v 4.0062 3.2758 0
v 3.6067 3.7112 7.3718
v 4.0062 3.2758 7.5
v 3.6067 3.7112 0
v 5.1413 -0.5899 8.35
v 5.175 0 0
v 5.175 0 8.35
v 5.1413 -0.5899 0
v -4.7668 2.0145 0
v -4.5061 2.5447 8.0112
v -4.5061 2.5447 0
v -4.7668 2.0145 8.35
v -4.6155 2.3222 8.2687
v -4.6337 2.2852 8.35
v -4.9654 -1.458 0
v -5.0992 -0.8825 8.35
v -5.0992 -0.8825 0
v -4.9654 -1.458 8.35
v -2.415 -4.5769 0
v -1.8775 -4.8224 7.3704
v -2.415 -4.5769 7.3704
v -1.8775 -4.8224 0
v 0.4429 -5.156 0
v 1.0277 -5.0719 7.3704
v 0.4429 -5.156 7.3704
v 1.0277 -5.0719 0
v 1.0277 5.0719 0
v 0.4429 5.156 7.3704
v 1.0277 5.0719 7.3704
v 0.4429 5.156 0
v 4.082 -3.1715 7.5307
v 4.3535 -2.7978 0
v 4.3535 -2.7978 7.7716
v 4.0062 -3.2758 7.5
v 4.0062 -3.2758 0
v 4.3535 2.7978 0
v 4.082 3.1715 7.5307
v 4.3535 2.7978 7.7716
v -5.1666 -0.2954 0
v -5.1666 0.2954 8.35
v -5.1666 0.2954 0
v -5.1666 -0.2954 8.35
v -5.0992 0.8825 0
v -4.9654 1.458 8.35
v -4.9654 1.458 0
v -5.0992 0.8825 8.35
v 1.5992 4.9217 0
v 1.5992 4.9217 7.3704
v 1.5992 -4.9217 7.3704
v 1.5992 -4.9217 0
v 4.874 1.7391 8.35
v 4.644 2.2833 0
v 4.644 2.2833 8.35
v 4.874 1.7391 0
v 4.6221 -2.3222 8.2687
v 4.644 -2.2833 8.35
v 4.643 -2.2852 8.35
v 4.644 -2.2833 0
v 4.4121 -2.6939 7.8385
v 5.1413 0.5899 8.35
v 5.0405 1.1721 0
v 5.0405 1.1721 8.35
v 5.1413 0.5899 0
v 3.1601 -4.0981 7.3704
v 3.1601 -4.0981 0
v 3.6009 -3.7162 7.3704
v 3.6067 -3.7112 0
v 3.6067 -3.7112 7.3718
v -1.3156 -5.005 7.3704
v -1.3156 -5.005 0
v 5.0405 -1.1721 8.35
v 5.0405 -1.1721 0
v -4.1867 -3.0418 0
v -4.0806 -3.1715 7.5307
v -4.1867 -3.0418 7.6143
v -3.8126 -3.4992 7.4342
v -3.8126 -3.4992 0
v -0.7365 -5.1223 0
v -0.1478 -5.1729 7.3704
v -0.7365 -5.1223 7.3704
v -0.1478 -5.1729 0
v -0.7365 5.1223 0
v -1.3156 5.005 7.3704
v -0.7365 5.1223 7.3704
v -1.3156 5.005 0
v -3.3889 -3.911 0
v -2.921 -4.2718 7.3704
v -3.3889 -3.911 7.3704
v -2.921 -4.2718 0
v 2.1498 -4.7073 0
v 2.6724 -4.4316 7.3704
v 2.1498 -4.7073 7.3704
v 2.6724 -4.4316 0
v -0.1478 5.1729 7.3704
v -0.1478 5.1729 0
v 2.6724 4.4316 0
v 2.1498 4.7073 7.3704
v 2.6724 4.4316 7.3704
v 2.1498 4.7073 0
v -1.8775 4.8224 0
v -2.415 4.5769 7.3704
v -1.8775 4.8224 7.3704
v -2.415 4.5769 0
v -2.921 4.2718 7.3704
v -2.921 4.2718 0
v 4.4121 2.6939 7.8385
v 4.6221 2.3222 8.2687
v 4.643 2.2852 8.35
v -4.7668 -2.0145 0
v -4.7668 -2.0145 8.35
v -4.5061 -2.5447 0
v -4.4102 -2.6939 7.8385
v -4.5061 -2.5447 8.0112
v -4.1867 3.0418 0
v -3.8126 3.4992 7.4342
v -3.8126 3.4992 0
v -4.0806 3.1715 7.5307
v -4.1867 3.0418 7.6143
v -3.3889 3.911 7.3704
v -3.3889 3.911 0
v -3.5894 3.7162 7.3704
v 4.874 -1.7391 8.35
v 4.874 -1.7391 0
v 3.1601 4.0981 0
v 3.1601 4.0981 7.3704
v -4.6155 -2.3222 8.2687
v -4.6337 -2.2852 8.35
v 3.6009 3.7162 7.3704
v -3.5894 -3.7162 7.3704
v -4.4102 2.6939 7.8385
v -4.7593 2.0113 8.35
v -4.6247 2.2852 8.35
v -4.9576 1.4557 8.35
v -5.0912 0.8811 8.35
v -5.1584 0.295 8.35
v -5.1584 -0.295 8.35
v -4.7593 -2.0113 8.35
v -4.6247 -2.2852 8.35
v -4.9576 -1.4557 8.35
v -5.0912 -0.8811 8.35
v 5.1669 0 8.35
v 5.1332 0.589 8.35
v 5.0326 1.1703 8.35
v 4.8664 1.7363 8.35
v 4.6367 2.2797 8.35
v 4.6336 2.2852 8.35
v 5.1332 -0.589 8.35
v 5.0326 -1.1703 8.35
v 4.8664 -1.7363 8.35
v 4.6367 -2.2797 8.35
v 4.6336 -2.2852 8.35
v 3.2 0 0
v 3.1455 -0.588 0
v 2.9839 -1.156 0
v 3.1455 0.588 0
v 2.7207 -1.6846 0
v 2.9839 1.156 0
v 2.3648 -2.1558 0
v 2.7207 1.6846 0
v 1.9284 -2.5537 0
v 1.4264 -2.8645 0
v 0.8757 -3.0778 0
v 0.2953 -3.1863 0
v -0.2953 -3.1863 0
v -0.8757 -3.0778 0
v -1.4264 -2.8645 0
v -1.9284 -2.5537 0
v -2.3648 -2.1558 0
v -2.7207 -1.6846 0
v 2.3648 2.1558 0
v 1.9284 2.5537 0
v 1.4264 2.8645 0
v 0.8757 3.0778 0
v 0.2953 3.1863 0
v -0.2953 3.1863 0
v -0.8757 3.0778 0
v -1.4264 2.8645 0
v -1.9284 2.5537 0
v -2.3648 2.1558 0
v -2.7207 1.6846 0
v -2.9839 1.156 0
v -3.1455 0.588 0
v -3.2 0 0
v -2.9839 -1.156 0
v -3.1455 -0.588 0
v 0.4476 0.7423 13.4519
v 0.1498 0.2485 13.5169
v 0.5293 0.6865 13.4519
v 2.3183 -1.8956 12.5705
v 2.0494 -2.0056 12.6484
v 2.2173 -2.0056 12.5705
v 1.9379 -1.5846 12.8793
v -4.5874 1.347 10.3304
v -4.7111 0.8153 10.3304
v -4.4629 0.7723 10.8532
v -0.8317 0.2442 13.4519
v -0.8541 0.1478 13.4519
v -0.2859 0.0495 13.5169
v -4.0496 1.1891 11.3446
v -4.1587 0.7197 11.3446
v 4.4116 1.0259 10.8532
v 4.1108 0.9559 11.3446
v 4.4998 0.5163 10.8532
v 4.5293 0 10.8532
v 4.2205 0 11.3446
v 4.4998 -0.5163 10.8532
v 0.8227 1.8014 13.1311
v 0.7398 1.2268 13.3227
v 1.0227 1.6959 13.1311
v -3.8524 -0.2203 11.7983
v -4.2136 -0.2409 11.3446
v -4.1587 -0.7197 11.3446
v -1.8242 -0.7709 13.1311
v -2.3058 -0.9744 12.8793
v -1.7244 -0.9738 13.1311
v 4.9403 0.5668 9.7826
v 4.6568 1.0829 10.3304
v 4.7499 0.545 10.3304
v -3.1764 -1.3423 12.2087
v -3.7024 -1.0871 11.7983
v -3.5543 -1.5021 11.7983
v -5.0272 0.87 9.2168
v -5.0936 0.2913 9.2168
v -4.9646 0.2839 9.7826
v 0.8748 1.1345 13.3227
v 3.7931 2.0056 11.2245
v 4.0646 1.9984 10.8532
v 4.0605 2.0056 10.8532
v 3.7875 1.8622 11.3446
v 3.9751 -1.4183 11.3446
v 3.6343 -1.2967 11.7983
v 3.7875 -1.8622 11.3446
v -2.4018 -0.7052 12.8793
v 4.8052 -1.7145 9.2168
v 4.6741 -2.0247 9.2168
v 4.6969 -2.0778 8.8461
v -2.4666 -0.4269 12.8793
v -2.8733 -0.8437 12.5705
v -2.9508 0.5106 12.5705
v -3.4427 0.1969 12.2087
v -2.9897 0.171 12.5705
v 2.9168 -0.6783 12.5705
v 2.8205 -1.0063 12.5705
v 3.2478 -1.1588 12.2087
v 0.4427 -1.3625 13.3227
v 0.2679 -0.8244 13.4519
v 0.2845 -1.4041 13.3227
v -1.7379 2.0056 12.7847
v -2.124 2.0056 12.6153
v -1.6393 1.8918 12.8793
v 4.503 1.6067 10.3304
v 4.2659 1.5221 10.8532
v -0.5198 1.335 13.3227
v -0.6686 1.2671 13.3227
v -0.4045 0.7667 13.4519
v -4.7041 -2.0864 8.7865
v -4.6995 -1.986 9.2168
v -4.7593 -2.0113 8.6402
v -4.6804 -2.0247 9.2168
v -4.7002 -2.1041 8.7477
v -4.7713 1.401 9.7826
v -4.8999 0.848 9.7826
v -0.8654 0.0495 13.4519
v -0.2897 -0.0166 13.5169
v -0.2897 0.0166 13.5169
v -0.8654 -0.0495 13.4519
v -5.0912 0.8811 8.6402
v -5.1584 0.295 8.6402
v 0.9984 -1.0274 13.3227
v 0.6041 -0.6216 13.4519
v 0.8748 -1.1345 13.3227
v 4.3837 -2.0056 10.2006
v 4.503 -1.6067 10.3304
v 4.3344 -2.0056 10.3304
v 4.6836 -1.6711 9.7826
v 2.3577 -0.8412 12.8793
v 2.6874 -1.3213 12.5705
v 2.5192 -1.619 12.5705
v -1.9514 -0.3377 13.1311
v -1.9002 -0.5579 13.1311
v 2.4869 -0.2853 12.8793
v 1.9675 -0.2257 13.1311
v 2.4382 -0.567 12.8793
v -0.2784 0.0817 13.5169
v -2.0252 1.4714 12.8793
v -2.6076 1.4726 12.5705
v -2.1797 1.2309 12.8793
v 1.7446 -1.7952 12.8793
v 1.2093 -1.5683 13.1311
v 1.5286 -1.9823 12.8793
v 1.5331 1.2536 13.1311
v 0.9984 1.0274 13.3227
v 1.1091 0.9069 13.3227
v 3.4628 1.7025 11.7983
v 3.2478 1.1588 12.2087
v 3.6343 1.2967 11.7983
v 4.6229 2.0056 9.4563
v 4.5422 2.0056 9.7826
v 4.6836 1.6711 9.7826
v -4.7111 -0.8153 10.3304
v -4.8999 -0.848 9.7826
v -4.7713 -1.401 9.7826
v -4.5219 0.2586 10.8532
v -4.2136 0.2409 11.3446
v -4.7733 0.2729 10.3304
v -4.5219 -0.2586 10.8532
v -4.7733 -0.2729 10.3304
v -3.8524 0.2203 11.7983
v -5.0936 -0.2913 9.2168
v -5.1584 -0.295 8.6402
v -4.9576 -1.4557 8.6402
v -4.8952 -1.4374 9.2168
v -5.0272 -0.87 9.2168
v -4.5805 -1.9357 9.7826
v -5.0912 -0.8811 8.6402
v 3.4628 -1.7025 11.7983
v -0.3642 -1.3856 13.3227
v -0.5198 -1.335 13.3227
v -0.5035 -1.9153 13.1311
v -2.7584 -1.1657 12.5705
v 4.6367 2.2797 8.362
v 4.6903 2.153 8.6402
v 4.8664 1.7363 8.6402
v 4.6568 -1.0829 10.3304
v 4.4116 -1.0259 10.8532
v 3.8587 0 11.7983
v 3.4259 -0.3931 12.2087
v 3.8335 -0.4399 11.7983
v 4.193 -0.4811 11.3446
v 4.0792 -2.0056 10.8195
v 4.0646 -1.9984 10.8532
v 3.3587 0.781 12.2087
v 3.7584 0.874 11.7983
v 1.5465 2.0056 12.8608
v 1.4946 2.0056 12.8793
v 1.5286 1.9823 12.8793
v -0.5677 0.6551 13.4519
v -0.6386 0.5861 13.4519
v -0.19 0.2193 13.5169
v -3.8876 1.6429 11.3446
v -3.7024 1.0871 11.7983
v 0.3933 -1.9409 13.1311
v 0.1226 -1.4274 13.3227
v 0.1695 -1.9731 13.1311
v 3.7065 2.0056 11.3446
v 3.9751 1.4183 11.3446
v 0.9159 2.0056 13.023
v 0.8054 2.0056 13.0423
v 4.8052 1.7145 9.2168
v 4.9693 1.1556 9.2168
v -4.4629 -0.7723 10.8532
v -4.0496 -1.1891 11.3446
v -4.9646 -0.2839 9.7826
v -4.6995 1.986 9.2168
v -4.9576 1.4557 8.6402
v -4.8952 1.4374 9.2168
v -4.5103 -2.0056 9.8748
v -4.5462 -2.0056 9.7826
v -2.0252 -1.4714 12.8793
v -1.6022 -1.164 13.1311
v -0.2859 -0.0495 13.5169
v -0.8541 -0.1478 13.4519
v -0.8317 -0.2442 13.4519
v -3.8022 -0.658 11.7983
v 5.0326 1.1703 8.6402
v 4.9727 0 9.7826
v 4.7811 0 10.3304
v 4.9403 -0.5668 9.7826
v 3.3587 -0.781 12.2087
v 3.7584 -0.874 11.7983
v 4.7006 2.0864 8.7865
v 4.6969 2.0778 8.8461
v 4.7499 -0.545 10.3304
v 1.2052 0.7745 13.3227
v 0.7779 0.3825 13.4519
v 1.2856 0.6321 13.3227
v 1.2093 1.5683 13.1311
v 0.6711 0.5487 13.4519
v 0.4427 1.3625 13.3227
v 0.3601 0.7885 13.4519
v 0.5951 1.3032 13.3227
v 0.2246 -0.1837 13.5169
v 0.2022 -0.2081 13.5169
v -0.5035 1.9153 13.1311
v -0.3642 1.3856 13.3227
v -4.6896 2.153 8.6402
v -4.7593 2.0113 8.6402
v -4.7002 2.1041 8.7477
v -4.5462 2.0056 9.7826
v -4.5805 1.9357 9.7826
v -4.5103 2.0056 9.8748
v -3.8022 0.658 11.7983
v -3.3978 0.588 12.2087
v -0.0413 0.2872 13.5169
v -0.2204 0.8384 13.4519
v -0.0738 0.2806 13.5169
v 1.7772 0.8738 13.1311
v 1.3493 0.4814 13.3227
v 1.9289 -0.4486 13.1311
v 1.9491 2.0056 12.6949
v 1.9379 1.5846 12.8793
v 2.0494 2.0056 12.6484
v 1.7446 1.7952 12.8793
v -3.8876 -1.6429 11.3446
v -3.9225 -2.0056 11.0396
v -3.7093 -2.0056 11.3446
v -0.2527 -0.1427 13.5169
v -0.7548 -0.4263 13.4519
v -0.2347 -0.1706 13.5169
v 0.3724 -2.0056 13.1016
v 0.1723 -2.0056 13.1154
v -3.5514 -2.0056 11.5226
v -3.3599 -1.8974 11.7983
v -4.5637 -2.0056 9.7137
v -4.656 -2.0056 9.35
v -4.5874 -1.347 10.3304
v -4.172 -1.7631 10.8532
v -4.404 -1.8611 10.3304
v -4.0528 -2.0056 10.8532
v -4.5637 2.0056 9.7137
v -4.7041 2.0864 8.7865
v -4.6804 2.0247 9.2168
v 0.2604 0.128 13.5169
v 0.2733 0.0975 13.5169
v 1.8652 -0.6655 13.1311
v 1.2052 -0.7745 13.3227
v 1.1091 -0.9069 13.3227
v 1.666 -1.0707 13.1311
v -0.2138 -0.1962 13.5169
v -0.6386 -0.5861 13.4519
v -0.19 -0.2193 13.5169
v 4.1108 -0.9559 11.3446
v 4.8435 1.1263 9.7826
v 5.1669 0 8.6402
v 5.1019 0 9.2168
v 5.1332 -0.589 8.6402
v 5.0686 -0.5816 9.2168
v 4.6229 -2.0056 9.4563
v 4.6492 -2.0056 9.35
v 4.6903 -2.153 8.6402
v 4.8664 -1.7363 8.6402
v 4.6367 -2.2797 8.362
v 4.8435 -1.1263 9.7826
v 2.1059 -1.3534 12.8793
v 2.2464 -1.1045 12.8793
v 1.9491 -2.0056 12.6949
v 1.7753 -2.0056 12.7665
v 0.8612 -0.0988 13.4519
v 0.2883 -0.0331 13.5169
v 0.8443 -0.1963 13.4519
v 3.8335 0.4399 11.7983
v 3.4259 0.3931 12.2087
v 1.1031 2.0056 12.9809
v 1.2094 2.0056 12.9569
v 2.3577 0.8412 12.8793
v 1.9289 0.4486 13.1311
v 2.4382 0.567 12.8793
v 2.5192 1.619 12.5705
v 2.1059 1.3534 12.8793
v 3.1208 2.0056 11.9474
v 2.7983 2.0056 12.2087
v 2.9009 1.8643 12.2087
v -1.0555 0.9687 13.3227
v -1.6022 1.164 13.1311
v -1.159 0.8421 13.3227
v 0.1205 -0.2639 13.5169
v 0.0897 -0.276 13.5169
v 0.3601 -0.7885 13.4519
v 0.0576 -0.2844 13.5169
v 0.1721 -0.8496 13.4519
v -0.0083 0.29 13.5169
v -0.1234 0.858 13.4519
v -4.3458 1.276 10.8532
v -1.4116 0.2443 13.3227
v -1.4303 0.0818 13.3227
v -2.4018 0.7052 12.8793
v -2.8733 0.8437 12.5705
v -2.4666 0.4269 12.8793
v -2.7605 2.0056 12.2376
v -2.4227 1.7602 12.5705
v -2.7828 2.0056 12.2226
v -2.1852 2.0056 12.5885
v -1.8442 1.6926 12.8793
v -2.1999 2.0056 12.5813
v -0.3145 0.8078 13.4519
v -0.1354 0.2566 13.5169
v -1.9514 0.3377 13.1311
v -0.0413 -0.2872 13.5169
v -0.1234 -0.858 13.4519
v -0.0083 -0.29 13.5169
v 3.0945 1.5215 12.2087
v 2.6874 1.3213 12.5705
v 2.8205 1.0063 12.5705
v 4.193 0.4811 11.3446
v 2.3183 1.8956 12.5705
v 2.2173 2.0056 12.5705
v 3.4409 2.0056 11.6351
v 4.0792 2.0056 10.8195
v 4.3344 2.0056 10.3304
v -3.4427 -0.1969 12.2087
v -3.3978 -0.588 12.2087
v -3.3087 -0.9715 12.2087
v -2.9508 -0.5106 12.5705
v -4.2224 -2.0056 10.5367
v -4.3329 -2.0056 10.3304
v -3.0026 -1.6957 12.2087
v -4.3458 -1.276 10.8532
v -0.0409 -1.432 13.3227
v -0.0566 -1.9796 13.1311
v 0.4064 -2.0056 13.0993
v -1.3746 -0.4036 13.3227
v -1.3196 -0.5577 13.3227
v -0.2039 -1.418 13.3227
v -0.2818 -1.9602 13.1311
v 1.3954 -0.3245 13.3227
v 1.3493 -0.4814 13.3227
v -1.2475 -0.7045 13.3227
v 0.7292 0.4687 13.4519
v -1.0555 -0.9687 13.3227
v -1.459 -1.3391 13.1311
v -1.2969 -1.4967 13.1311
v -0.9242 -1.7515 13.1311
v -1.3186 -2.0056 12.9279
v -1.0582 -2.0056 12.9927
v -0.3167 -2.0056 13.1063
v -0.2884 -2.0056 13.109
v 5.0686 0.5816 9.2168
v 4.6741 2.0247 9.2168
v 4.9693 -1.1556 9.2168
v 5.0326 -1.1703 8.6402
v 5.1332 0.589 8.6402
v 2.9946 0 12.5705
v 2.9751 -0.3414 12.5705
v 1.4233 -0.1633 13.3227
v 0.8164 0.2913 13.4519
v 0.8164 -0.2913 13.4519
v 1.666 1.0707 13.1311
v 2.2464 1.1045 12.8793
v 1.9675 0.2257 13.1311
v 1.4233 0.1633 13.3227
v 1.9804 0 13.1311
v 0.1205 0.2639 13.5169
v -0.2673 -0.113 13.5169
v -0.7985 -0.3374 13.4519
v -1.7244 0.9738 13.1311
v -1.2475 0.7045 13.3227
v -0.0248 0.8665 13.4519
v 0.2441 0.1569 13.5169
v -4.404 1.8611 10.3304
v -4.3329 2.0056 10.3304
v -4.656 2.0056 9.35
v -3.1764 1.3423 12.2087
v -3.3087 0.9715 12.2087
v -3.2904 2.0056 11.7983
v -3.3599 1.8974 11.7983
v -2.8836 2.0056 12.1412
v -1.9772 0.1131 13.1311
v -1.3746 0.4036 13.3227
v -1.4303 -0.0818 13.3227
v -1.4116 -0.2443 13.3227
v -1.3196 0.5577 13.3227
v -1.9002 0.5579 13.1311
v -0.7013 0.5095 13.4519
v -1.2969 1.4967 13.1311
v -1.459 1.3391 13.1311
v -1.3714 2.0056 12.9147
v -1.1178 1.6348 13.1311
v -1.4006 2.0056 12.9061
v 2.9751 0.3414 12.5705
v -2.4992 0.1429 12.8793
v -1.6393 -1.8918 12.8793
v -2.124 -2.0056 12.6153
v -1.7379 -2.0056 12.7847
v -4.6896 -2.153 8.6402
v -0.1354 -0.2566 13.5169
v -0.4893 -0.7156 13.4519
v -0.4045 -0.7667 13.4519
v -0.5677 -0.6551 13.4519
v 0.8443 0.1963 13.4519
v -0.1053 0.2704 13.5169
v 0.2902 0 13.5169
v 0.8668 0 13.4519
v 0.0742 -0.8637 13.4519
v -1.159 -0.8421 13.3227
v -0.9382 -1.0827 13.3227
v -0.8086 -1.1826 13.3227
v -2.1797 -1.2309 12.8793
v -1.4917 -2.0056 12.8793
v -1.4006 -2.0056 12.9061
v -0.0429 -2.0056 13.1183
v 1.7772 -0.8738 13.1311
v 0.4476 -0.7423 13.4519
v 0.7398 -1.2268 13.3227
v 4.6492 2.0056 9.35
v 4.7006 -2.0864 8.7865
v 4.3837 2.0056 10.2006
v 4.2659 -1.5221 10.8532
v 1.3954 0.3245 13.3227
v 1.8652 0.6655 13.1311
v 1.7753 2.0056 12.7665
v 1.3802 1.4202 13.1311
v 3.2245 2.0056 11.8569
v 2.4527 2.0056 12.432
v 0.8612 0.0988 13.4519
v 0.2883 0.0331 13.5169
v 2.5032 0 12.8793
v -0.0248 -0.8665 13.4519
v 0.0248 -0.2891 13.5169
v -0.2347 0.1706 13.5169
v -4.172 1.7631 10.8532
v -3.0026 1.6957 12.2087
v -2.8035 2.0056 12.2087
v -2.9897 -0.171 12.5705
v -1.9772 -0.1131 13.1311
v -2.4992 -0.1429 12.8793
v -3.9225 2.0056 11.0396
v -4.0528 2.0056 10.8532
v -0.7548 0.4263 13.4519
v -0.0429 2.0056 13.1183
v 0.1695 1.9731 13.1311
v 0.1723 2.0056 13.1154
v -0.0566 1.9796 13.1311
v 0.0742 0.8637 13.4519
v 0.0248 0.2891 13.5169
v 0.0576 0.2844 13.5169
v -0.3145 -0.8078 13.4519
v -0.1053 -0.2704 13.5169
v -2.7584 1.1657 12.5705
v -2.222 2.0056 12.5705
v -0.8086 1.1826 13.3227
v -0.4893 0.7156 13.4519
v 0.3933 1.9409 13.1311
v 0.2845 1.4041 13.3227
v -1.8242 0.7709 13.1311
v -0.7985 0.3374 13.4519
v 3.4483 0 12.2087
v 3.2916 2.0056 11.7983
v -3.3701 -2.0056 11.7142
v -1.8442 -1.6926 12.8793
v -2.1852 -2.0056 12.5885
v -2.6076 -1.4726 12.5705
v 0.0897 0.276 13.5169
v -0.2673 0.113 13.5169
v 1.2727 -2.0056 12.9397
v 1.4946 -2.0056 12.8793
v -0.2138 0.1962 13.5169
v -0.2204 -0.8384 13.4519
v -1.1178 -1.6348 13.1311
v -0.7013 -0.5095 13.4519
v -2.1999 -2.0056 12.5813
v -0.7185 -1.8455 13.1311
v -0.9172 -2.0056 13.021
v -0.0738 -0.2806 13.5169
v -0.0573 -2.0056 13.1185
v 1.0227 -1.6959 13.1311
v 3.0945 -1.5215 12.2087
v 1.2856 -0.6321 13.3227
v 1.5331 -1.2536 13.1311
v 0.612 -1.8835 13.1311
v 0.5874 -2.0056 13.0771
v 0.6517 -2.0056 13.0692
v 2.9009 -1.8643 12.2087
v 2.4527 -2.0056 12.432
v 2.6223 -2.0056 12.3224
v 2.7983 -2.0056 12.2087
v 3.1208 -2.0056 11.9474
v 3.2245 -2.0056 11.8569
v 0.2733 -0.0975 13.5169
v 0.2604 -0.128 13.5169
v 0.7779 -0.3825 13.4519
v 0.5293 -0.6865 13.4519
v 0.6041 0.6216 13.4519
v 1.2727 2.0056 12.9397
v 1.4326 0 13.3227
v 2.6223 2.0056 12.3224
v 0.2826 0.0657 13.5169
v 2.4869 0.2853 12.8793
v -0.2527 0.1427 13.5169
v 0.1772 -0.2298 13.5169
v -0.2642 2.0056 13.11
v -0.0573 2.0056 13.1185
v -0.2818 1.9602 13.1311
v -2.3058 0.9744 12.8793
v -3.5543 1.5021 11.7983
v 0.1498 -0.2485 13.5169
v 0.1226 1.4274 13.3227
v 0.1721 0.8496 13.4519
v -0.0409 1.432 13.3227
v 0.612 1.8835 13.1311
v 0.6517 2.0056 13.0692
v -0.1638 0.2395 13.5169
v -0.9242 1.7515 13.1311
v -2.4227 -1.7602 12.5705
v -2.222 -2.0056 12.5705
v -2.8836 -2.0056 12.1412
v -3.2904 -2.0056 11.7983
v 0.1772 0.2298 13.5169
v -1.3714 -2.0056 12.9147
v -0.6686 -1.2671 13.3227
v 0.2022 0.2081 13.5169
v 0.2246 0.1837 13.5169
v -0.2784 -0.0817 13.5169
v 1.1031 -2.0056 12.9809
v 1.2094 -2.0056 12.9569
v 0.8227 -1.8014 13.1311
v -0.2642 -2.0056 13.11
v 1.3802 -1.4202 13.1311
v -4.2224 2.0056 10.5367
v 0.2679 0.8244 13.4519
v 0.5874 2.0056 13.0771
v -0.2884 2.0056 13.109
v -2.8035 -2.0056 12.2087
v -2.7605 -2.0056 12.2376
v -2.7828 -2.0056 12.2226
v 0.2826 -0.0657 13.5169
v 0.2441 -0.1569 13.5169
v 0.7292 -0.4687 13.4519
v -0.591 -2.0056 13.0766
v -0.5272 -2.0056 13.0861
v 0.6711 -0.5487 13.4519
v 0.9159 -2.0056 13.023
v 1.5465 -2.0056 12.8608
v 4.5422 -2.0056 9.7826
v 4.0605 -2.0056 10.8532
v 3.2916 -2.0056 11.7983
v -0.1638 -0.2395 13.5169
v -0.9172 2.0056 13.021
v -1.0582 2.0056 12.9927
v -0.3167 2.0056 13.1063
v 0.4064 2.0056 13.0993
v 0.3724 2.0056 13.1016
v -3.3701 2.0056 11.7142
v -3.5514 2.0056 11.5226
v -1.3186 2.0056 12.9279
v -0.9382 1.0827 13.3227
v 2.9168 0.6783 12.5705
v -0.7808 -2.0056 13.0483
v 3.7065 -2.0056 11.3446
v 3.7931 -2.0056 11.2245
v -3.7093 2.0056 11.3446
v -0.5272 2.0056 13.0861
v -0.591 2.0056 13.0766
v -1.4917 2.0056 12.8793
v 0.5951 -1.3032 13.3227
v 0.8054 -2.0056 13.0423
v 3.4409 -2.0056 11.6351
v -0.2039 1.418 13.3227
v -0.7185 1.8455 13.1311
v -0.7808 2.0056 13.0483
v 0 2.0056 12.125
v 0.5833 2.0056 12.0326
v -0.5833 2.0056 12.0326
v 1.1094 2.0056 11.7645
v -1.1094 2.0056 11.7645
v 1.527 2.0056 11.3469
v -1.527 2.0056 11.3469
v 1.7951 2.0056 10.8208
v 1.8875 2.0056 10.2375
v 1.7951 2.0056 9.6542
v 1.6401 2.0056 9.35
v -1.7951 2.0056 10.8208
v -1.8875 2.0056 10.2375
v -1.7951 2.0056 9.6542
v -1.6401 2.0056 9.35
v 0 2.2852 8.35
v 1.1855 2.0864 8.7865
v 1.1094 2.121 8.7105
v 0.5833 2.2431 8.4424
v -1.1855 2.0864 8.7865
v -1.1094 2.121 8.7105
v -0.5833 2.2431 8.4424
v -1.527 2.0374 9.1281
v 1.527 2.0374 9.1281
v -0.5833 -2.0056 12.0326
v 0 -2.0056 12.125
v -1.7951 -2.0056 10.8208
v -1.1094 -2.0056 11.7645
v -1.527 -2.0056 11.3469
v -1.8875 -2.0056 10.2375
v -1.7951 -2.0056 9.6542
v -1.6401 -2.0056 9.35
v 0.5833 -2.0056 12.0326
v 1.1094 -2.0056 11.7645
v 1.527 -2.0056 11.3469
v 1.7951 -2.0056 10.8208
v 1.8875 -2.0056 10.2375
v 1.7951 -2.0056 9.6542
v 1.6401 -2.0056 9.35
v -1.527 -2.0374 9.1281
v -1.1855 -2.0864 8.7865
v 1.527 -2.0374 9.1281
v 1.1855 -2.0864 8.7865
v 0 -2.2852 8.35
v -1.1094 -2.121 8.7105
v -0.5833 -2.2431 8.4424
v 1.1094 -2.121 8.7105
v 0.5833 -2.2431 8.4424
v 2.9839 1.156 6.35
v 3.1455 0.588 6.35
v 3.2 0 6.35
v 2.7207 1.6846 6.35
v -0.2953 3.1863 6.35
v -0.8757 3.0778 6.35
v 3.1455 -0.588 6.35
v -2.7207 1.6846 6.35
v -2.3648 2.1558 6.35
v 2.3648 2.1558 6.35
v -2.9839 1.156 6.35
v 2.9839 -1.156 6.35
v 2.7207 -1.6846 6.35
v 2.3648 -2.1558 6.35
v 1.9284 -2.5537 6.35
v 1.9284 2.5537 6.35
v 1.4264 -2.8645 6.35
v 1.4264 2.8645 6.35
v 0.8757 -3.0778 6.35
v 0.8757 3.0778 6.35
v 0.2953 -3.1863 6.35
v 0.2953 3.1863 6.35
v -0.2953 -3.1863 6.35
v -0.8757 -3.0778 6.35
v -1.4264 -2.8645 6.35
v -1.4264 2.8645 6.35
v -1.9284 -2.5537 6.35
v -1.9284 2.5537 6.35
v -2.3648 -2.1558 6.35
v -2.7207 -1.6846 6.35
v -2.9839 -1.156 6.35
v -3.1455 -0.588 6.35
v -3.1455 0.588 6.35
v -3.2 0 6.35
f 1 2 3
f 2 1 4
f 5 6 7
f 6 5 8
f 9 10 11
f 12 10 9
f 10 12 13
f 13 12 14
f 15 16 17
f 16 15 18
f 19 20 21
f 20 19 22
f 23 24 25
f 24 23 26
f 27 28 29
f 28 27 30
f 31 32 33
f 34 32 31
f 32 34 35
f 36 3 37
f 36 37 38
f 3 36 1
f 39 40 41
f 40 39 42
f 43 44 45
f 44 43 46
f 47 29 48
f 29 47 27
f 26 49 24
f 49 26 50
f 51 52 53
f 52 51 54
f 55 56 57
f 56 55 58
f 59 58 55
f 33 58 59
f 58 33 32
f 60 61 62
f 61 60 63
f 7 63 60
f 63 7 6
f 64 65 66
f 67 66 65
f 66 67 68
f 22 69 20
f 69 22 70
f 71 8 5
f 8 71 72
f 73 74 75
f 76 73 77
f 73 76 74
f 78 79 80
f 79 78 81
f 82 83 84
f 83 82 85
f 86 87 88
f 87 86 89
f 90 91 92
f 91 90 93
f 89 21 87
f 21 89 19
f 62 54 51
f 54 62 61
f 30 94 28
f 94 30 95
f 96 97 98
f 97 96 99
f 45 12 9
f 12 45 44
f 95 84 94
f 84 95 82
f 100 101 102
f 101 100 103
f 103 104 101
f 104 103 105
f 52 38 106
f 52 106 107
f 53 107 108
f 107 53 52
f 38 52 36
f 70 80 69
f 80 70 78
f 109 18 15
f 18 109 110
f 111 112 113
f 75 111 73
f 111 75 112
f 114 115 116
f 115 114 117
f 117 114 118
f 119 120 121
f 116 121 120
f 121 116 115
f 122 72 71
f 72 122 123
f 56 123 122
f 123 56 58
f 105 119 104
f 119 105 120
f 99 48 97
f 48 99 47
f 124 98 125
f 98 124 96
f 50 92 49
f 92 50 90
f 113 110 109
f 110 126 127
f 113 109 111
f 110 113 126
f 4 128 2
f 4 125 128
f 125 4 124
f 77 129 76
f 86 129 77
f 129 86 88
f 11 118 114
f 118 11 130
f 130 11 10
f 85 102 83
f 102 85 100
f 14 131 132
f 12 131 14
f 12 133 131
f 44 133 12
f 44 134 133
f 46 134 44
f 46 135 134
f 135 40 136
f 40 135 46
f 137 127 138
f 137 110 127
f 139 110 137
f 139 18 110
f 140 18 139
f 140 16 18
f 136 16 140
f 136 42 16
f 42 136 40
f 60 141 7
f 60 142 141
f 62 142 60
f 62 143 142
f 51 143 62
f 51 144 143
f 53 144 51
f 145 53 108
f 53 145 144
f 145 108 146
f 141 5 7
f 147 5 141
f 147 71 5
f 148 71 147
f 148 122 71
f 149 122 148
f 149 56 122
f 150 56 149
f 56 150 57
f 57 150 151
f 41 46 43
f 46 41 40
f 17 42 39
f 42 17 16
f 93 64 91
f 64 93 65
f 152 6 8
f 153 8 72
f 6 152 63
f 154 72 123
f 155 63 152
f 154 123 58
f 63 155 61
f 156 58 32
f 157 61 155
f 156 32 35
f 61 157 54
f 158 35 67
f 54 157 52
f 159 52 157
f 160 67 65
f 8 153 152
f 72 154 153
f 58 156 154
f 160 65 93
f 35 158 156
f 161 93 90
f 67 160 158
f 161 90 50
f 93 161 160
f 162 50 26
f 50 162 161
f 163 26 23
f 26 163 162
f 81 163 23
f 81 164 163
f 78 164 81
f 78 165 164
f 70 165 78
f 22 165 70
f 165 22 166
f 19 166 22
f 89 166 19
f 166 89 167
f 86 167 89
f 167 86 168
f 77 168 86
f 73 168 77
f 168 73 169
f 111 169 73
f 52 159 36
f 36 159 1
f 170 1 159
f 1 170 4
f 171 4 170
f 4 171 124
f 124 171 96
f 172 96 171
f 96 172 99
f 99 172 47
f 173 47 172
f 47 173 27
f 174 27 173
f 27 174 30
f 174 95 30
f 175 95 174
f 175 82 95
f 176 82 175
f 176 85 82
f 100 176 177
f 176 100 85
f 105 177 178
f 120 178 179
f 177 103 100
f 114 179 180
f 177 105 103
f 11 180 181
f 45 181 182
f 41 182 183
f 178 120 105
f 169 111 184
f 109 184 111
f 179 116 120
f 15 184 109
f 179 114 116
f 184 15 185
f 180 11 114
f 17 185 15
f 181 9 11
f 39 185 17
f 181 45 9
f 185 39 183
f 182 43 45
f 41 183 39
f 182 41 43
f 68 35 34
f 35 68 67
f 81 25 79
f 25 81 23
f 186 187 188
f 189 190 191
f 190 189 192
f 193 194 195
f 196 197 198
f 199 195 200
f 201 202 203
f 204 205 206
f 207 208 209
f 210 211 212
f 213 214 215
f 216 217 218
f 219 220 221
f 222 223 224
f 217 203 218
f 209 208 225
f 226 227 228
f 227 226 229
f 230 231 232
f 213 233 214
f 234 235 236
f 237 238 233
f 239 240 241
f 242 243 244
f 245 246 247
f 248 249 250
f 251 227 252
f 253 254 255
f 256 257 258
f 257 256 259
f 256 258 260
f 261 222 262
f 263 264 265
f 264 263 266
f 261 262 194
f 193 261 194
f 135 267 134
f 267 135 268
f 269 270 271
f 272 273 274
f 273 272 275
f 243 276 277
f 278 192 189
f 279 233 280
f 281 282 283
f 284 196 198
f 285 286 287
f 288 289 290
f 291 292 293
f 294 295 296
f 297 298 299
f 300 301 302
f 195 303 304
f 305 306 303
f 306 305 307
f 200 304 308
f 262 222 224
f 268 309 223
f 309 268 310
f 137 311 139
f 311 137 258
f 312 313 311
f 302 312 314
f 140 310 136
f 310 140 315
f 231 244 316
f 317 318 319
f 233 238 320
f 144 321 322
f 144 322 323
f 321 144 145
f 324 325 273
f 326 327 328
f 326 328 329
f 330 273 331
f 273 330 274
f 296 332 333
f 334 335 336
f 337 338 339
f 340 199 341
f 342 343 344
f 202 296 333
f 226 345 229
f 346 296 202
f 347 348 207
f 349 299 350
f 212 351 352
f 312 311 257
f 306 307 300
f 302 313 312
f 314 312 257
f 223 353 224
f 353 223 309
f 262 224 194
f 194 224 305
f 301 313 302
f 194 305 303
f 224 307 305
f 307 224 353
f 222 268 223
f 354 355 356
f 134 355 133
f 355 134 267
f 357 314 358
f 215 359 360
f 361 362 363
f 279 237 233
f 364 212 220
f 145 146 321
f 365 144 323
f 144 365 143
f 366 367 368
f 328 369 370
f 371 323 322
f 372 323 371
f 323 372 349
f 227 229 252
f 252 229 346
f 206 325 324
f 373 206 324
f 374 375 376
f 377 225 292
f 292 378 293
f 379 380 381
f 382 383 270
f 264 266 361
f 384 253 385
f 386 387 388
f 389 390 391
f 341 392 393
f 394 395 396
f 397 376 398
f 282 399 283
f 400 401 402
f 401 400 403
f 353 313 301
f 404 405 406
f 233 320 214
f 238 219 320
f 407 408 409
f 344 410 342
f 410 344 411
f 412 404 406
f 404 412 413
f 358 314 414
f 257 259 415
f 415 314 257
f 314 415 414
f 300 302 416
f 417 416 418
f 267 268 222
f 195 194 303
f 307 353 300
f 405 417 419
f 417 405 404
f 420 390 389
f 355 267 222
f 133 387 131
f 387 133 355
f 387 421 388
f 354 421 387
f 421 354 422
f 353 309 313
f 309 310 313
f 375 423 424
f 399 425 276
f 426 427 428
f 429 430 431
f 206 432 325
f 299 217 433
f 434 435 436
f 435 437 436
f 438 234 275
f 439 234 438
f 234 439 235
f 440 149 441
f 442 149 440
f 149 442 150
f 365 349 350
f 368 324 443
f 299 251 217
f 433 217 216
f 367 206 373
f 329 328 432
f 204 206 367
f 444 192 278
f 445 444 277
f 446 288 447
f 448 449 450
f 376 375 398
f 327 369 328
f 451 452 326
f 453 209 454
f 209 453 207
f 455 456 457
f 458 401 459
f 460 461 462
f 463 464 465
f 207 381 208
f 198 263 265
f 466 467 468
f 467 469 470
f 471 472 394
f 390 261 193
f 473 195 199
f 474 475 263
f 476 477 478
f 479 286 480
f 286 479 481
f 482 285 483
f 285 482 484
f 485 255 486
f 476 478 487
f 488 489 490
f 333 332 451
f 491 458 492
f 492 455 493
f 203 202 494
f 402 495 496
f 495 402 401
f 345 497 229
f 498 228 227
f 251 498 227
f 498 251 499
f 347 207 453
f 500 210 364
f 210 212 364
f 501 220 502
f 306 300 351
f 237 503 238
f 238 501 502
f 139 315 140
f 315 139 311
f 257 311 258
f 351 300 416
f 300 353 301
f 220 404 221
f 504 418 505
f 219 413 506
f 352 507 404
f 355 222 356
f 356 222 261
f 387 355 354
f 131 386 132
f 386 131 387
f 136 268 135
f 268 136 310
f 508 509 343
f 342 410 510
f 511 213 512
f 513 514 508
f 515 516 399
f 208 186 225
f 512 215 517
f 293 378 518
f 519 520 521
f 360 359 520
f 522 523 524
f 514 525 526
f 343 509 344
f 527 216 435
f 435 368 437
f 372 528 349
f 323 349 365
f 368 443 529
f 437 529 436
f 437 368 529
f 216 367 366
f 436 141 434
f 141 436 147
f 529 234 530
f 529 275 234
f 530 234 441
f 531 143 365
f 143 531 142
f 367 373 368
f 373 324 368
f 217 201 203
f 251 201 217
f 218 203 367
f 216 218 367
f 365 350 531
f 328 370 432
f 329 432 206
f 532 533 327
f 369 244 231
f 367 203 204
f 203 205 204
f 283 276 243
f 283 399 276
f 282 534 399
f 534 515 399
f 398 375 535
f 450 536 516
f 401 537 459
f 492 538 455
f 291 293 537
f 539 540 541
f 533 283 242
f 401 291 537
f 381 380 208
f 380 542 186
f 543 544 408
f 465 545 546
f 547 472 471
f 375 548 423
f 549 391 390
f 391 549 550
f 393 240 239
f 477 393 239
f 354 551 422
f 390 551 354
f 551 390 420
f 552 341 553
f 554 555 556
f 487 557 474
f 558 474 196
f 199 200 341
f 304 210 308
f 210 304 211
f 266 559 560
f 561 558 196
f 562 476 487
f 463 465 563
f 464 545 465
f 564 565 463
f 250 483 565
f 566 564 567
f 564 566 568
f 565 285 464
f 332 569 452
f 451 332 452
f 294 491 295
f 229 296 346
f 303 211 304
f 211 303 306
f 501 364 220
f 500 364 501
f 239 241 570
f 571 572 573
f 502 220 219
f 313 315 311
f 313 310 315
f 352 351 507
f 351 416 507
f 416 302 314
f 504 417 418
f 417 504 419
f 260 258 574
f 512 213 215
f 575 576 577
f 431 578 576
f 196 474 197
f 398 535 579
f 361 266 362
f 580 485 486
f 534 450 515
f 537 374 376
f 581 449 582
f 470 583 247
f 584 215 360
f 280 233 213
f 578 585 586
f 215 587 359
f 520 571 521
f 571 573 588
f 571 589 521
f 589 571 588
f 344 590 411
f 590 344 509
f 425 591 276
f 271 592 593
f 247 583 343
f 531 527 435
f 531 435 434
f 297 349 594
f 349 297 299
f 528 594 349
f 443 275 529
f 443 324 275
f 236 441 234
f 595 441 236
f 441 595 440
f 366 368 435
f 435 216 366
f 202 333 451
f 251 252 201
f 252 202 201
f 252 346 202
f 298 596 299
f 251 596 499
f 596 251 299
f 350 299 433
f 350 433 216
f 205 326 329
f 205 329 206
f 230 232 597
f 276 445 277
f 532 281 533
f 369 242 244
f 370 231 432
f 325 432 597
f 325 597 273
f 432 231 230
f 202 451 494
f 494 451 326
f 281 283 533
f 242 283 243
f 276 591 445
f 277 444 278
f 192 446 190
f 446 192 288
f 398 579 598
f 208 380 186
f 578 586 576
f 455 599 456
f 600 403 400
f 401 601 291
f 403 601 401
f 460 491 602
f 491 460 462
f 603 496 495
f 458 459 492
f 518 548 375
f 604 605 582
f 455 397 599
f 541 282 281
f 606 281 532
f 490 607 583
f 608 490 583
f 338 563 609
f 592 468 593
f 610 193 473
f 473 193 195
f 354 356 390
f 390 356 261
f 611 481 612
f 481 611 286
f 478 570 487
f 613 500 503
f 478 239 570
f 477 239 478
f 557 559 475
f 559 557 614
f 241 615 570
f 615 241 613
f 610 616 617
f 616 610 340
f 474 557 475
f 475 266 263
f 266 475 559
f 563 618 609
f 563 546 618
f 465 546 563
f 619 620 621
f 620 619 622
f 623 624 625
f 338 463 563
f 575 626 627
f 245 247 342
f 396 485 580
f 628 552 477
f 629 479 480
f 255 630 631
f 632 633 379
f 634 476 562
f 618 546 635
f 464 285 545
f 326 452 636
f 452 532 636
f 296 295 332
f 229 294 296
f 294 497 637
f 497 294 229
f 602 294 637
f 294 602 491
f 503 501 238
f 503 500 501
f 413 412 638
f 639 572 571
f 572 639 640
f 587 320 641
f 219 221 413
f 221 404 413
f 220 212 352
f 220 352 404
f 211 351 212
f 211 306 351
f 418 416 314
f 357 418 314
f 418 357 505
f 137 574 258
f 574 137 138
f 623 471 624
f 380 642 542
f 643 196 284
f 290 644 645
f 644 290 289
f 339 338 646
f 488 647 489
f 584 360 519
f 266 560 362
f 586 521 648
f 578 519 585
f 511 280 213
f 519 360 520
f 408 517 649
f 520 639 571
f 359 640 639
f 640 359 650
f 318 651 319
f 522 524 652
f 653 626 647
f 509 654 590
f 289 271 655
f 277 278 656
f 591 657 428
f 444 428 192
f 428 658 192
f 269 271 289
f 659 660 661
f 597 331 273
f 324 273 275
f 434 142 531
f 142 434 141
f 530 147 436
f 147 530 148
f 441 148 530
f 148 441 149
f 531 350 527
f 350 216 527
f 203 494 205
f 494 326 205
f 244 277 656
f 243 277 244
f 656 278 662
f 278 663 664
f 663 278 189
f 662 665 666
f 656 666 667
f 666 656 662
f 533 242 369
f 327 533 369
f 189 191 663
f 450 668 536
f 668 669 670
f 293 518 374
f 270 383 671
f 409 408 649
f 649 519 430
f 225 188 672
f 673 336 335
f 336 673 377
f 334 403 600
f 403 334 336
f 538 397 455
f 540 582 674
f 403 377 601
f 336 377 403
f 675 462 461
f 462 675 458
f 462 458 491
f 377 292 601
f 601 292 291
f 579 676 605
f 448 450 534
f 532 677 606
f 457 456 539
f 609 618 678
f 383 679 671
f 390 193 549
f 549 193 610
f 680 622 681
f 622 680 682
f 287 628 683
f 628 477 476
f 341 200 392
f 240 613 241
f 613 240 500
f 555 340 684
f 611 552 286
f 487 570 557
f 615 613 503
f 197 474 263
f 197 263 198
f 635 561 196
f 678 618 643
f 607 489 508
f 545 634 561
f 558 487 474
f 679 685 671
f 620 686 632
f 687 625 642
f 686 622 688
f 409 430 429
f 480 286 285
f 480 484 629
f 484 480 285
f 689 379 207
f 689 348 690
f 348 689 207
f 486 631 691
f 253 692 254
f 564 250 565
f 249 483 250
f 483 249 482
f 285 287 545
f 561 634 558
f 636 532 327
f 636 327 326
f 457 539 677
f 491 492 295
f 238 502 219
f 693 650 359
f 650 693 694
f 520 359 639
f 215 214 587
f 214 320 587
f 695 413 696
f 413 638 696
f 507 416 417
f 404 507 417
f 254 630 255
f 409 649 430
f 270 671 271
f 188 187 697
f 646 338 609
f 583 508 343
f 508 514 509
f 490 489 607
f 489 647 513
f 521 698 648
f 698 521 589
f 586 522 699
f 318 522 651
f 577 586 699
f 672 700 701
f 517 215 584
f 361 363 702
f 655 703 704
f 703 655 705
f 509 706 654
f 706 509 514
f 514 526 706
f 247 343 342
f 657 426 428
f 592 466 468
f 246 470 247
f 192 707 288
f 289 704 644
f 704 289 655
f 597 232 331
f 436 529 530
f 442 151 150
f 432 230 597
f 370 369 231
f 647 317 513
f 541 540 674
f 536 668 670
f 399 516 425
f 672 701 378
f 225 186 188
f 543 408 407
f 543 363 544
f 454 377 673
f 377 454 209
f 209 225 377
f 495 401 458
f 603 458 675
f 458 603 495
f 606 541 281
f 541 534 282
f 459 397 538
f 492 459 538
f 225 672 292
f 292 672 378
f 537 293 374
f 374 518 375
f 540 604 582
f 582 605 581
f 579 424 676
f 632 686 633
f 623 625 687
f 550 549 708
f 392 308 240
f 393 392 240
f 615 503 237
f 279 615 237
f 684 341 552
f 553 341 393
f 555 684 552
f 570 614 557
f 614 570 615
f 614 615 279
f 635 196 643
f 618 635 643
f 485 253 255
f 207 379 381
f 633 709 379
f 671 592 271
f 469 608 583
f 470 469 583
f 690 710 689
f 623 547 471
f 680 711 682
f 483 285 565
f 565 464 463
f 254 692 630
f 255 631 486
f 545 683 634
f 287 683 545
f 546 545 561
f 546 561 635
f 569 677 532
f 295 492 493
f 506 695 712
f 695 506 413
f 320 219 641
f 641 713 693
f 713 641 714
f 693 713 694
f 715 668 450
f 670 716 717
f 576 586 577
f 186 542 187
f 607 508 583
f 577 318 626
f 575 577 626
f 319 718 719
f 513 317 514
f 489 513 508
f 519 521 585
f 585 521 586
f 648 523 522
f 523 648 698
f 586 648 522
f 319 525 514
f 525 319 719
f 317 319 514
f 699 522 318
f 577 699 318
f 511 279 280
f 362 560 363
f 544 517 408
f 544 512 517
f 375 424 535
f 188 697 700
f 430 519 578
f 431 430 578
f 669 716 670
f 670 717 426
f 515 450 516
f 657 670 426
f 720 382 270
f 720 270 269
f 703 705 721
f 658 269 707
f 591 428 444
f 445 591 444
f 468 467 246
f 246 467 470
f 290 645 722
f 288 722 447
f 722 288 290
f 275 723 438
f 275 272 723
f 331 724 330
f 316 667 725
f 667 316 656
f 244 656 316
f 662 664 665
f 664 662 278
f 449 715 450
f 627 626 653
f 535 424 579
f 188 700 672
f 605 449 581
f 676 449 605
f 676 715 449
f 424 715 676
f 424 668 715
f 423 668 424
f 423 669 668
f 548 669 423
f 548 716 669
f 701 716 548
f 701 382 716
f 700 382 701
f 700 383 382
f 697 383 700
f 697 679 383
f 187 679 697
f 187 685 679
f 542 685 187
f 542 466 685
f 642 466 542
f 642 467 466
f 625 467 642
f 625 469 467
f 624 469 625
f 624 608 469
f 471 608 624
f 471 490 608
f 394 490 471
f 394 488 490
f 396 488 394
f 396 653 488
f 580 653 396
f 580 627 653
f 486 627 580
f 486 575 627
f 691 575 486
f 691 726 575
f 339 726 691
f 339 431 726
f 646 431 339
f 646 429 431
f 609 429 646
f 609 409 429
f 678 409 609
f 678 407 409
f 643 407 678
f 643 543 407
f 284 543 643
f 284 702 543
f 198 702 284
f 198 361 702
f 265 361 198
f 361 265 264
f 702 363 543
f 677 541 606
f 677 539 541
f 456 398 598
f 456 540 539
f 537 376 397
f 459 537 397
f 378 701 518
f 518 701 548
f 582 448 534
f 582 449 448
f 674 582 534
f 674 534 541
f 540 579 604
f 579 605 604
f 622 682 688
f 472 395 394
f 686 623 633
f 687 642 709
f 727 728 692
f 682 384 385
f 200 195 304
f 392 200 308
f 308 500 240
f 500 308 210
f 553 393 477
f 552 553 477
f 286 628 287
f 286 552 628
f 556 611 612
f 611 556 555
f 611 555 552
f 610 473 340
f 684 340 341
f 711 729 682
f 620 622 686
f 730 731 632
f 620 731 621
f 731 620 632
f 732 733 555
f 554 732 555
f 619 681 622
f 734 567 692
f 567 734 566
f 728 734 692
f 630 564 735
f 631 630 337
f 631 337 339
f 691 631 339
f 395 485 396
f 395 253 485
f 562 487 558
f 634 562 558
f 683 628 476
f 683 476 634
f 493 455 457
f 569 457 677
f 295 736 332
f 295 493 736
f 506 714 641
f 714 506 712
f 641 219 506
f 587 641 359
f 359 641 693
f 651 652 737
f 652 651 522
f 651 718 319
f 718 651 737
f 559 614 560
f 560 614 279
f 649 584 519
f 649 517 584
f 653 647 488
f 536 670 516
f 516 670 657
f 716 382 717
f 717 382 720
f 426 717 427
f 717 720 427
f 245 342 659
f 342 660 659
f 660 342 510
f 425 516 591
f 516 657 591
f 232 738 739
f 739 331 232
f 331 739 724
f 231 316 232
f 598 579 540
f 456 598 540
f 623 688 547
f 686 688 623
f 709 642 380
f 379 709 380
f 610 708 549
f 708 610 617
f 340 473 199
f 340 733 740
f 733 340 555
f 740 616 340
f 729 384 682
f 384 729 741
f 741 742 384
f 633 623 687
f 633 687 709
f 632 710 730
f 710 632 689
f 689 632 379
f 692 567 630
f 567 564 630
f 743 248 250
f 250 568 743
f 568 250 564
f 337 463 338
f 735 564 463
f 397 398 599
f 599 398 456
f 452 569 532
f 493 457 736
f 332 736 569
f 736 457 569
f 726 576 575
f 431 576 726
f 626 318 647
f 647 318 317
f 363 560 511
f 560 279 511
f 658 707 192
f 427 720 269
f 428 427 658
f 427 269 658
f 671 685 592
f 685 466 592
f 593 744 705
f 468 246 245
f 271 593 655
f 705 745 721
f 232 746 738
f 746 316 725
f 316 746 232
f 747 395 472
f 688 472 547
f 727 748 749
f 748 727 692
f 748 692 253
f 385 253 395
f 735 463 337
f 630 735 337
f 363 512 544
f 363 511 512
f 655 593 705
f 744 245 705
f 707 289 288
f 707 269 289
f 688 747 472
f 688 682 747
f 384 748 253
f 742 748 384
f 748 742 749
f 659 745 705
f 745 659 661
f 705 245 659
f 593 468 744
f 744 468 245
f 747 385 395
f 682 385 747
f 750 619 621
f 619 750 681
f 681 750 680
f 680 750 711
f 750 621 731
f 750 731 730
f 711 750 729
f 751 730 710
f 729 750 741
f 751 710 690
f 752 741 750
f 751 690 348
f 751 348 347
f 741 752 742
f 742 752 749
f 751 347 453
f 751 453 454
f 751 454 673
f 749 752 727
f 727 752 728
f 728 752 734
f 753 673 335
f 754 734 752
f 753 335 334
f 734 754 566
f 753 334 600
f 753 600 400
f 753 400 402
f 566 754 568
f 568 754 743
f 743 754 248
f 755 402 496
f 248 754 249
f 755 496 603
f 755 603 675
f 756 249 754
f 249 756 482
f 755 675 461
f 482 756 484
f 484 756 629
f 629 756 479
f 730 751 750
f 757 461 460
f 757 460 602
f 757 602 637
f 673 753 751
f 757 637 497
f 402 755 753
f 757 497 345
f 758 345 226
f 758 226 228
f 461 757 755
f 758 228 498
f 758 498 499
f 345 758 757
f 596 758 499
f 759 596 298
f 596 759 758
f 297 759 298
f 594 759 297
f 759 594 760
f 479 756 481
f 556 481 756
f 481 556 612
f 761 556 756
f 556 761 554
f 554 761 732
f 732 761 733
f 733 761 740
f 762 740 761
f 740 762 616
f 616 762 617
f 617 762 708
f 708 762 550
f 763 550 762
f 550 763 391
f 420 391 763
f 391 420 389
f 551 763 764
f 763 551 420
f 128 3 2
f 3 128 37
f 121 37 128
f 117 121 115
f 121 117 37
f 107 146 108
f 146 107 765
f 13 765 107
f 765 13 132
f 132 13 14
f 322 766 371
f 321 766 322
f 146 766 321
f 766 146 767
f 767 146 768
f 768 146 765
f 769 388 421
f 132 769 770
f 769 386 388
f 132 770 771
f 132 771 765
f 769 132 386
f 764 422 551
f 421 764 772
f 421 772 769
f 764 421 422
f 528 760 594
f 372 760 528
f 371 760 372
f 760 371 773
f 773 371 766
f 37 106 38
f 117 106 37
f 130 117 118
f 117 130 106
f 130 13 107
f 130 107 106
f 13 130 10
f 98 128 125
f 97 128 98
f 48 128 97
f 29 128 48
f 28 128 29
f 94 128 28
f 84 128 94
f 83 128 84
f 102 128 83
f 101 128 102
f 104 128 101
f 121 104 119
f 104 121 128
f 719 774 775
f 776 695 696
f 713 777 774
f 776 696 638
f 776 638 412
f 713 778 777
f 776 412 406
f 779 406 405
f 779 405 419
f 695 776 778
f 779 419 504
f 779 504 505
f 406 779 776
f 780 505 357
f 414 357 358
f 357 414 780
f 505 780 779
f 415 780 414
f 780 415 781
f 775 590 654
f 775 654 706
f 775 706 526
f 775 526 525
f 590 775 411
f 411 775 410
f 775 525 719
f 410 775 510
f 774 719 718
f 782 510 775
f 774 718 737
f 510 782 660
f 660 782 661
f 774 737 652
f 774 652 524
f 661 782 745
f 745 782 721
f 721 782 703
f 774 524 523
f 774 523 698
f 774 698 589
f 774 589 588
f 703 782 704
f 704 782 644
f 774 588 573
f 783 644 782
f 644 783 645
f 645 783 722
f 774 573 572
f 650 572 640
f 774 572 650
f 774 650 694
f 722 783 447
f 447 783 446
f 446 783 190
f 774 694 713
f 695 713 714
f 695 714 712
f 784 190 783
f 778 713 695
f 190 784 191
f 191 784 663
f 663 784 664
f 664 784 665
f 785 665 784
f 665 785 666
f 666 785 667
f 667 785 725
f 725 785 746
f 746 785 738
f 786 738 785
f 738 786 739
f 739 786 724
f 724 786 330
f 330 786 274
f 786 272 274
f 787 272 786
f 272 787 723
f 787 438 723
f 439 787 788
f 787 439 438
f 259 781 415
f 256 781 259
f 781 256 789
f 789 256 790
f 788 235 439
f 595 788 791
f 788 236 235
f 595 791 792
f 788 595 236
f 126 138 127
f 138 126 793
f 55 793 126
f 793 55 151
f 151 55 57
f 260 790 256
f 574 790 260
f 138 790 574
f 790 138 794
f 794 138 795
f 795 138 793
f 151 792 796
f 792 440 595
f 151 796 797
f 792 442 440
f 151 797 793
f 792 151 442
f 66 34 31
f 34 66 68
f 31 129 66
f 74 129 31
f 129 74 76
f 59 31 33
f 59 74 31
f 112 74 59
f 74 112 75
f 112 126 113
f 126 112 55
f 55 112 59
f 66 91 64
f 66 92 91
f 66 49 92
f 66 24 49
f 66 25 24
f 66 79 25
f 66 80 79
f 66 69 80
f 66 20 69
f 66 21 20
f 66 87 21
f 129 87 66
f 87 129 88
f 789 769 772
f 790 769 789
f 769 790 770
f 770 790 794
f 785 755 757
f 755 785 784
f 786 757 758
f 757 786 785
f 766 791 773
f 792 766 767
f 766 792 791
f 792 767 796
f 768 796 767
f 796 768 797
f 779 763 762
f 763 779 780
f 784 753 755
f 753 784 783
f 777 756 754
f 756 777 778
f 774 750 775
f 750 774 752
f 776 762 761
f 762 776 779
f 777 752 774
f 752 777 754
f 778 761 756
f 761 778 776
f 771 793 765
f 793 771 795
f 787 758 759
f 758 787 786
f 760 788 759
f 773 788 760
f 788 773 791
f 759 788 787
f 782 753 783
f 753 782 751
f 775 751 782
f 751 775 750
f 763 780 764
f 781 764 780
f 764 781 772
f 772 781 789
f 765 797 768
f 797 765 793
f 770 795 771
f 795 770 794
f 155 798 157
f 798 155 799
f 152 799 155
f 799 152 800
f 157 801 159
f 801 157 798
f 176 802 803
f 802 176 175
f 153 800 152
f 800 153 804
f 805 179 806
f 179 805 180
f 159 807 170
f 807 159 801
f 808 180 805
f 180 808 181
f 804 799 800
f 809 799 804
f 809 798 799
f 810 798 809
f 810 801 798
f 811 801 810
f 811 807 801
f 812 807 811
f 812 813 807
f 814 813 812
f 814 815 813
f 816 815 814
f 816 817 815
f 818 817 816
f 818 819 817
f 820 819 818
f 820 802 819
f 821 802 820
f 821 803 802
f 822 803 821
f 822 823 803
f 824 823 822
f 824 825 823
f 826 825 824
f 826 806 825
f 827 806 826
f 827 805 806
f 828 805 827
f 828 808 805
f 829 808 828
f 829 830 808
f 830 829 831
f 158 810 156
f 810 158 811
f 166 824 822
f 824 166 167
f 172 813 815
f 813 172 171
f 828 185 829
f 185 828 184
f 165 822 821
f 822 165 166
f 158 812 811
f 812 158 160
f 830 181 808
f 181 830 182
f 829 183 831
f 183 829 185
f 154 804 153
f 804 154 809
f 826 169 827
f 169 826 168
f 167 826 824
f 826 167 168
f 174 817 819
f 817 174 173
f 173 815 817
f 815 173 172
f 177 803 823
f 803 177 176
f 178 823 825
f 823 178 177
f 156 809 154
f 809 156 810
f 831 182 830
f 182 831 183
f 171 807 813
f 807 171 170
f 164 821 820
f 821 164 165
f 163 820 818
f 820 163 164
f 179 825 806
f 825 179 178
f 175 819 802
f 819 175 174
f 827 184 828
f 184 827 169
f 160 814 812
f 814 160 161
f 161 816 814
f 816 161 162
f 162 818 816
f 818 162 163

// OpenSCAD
function in_to_mm(in) = in * 25.4;

// User Control Variables
$fs = 0.6;
$fa = 6;

TOLERANCE = 0.05;

MAGNET_DIAMETER = in_to_mm(1/4);
MAGNET_HEIGHT = in_to_mm(1/4);

WALL_THICKNESS = 2;

LOOP_THICKNESS = 1.4;
LOOP_WIDTH = 4;

SKIRT_WALL_THIKNESS = 0.6;

// Calculated Variables
MAGNET_RADIUS = MAGNET_DIAMETER/2;
BASE_RADIUS = MAGNET_RADIUS + WALL_THICKNESS;
LOOP_HOLE_RADIUS = (BASE_RADIUS - LOOP_THICKNESS) / 2;
BASE_HEIGHT = MAGNET_HEIGHT + WALL_THICKNESS;
TOTAL_HEIGHT = BASE_HEIGHT + BASE_RADIUS;
HOLE_HEIGHT = BASE_HEIGHT + BASE_RADIUS - LOOP_HOLE_RADIUS - LOOP_THICKNESS;


module Magnet(tolerance = 0){
	translate([0,0,-tolerance])
	cylinder( 
		h = MAGNET_HEIGHT + tolerance,
		r = MAGNET_RADIUS + tolerance / 2
	);
}

module Base(){
	union(){
		cylinder(
			h = MAGNET_HEIGHT + WALL_THICKNESS,
			r = MAGNET_RADIUS + WALL_THICKNESS
		);
			translate([0,0,MAGNET_HEIGHT + WALL_THICKNESS])
		sphere(
			r = MAGNET_RADIUS + WALL_THICKNESS
		);
	}
}

module LoopReliefCut(radius = 2, size = 10,){
	translate([-size/2,radius , radius])
	minkowski(){
		cube(size = size);
		sphere(radius);
	}
}

module Hole(){
	translate([0,0,HOLE_HEIGHT]) rotate([90,0,0])
	cylinder(
		r = LOOP_HOLE_RADIUS,
		h = MAGNET_HEIGHT + WALL_THICKNESS * 2,
		center = true
	);  
	translate([0,0,BASE_HEIGHT-WALL_THICKNESS/2]){
		translate([0,LOOP_WIDTH/2,0])
		LoopReliefCut();
		rotate([0,0,180])translate([0,LOOP_WIDTH/2,0])
		LoopReliefCut();
	}
}

module Skirt(){
	skirt_r1 = MAGNET_RADIUS + SKIRT_WALL_THIKNESS ;
	skirt_r2 = BASE_RADIUS - SKIRT_WALL_THIKNESS ;
	skirt_h = skirt_r2 - skirt_r1;
	difference(){
		cylinder(
			r = BASE_RADIUS,
			h = skirt_h
		);
		cylinder(
			r1 = skirt_r1,
			r2 = skirt_r2,
			h = skirt_h
		);
	}
}

module Body(){
	difference(){
		Base();
		Magnet(TOLERANCE);
		Hole();
		}
}

module KeyChain(style = "flat"){
	if (style == "male") {
		difference(){
			Body();
			Skirt();
		}
	} else if (style == "female"){
		union(){
			Body();
			rotate([180,0,0])
			Skirt();
		}
	} else if (style == "flat"){
		Body();
	} else {
	}
}

color("gray")
KeyChain("flat");
